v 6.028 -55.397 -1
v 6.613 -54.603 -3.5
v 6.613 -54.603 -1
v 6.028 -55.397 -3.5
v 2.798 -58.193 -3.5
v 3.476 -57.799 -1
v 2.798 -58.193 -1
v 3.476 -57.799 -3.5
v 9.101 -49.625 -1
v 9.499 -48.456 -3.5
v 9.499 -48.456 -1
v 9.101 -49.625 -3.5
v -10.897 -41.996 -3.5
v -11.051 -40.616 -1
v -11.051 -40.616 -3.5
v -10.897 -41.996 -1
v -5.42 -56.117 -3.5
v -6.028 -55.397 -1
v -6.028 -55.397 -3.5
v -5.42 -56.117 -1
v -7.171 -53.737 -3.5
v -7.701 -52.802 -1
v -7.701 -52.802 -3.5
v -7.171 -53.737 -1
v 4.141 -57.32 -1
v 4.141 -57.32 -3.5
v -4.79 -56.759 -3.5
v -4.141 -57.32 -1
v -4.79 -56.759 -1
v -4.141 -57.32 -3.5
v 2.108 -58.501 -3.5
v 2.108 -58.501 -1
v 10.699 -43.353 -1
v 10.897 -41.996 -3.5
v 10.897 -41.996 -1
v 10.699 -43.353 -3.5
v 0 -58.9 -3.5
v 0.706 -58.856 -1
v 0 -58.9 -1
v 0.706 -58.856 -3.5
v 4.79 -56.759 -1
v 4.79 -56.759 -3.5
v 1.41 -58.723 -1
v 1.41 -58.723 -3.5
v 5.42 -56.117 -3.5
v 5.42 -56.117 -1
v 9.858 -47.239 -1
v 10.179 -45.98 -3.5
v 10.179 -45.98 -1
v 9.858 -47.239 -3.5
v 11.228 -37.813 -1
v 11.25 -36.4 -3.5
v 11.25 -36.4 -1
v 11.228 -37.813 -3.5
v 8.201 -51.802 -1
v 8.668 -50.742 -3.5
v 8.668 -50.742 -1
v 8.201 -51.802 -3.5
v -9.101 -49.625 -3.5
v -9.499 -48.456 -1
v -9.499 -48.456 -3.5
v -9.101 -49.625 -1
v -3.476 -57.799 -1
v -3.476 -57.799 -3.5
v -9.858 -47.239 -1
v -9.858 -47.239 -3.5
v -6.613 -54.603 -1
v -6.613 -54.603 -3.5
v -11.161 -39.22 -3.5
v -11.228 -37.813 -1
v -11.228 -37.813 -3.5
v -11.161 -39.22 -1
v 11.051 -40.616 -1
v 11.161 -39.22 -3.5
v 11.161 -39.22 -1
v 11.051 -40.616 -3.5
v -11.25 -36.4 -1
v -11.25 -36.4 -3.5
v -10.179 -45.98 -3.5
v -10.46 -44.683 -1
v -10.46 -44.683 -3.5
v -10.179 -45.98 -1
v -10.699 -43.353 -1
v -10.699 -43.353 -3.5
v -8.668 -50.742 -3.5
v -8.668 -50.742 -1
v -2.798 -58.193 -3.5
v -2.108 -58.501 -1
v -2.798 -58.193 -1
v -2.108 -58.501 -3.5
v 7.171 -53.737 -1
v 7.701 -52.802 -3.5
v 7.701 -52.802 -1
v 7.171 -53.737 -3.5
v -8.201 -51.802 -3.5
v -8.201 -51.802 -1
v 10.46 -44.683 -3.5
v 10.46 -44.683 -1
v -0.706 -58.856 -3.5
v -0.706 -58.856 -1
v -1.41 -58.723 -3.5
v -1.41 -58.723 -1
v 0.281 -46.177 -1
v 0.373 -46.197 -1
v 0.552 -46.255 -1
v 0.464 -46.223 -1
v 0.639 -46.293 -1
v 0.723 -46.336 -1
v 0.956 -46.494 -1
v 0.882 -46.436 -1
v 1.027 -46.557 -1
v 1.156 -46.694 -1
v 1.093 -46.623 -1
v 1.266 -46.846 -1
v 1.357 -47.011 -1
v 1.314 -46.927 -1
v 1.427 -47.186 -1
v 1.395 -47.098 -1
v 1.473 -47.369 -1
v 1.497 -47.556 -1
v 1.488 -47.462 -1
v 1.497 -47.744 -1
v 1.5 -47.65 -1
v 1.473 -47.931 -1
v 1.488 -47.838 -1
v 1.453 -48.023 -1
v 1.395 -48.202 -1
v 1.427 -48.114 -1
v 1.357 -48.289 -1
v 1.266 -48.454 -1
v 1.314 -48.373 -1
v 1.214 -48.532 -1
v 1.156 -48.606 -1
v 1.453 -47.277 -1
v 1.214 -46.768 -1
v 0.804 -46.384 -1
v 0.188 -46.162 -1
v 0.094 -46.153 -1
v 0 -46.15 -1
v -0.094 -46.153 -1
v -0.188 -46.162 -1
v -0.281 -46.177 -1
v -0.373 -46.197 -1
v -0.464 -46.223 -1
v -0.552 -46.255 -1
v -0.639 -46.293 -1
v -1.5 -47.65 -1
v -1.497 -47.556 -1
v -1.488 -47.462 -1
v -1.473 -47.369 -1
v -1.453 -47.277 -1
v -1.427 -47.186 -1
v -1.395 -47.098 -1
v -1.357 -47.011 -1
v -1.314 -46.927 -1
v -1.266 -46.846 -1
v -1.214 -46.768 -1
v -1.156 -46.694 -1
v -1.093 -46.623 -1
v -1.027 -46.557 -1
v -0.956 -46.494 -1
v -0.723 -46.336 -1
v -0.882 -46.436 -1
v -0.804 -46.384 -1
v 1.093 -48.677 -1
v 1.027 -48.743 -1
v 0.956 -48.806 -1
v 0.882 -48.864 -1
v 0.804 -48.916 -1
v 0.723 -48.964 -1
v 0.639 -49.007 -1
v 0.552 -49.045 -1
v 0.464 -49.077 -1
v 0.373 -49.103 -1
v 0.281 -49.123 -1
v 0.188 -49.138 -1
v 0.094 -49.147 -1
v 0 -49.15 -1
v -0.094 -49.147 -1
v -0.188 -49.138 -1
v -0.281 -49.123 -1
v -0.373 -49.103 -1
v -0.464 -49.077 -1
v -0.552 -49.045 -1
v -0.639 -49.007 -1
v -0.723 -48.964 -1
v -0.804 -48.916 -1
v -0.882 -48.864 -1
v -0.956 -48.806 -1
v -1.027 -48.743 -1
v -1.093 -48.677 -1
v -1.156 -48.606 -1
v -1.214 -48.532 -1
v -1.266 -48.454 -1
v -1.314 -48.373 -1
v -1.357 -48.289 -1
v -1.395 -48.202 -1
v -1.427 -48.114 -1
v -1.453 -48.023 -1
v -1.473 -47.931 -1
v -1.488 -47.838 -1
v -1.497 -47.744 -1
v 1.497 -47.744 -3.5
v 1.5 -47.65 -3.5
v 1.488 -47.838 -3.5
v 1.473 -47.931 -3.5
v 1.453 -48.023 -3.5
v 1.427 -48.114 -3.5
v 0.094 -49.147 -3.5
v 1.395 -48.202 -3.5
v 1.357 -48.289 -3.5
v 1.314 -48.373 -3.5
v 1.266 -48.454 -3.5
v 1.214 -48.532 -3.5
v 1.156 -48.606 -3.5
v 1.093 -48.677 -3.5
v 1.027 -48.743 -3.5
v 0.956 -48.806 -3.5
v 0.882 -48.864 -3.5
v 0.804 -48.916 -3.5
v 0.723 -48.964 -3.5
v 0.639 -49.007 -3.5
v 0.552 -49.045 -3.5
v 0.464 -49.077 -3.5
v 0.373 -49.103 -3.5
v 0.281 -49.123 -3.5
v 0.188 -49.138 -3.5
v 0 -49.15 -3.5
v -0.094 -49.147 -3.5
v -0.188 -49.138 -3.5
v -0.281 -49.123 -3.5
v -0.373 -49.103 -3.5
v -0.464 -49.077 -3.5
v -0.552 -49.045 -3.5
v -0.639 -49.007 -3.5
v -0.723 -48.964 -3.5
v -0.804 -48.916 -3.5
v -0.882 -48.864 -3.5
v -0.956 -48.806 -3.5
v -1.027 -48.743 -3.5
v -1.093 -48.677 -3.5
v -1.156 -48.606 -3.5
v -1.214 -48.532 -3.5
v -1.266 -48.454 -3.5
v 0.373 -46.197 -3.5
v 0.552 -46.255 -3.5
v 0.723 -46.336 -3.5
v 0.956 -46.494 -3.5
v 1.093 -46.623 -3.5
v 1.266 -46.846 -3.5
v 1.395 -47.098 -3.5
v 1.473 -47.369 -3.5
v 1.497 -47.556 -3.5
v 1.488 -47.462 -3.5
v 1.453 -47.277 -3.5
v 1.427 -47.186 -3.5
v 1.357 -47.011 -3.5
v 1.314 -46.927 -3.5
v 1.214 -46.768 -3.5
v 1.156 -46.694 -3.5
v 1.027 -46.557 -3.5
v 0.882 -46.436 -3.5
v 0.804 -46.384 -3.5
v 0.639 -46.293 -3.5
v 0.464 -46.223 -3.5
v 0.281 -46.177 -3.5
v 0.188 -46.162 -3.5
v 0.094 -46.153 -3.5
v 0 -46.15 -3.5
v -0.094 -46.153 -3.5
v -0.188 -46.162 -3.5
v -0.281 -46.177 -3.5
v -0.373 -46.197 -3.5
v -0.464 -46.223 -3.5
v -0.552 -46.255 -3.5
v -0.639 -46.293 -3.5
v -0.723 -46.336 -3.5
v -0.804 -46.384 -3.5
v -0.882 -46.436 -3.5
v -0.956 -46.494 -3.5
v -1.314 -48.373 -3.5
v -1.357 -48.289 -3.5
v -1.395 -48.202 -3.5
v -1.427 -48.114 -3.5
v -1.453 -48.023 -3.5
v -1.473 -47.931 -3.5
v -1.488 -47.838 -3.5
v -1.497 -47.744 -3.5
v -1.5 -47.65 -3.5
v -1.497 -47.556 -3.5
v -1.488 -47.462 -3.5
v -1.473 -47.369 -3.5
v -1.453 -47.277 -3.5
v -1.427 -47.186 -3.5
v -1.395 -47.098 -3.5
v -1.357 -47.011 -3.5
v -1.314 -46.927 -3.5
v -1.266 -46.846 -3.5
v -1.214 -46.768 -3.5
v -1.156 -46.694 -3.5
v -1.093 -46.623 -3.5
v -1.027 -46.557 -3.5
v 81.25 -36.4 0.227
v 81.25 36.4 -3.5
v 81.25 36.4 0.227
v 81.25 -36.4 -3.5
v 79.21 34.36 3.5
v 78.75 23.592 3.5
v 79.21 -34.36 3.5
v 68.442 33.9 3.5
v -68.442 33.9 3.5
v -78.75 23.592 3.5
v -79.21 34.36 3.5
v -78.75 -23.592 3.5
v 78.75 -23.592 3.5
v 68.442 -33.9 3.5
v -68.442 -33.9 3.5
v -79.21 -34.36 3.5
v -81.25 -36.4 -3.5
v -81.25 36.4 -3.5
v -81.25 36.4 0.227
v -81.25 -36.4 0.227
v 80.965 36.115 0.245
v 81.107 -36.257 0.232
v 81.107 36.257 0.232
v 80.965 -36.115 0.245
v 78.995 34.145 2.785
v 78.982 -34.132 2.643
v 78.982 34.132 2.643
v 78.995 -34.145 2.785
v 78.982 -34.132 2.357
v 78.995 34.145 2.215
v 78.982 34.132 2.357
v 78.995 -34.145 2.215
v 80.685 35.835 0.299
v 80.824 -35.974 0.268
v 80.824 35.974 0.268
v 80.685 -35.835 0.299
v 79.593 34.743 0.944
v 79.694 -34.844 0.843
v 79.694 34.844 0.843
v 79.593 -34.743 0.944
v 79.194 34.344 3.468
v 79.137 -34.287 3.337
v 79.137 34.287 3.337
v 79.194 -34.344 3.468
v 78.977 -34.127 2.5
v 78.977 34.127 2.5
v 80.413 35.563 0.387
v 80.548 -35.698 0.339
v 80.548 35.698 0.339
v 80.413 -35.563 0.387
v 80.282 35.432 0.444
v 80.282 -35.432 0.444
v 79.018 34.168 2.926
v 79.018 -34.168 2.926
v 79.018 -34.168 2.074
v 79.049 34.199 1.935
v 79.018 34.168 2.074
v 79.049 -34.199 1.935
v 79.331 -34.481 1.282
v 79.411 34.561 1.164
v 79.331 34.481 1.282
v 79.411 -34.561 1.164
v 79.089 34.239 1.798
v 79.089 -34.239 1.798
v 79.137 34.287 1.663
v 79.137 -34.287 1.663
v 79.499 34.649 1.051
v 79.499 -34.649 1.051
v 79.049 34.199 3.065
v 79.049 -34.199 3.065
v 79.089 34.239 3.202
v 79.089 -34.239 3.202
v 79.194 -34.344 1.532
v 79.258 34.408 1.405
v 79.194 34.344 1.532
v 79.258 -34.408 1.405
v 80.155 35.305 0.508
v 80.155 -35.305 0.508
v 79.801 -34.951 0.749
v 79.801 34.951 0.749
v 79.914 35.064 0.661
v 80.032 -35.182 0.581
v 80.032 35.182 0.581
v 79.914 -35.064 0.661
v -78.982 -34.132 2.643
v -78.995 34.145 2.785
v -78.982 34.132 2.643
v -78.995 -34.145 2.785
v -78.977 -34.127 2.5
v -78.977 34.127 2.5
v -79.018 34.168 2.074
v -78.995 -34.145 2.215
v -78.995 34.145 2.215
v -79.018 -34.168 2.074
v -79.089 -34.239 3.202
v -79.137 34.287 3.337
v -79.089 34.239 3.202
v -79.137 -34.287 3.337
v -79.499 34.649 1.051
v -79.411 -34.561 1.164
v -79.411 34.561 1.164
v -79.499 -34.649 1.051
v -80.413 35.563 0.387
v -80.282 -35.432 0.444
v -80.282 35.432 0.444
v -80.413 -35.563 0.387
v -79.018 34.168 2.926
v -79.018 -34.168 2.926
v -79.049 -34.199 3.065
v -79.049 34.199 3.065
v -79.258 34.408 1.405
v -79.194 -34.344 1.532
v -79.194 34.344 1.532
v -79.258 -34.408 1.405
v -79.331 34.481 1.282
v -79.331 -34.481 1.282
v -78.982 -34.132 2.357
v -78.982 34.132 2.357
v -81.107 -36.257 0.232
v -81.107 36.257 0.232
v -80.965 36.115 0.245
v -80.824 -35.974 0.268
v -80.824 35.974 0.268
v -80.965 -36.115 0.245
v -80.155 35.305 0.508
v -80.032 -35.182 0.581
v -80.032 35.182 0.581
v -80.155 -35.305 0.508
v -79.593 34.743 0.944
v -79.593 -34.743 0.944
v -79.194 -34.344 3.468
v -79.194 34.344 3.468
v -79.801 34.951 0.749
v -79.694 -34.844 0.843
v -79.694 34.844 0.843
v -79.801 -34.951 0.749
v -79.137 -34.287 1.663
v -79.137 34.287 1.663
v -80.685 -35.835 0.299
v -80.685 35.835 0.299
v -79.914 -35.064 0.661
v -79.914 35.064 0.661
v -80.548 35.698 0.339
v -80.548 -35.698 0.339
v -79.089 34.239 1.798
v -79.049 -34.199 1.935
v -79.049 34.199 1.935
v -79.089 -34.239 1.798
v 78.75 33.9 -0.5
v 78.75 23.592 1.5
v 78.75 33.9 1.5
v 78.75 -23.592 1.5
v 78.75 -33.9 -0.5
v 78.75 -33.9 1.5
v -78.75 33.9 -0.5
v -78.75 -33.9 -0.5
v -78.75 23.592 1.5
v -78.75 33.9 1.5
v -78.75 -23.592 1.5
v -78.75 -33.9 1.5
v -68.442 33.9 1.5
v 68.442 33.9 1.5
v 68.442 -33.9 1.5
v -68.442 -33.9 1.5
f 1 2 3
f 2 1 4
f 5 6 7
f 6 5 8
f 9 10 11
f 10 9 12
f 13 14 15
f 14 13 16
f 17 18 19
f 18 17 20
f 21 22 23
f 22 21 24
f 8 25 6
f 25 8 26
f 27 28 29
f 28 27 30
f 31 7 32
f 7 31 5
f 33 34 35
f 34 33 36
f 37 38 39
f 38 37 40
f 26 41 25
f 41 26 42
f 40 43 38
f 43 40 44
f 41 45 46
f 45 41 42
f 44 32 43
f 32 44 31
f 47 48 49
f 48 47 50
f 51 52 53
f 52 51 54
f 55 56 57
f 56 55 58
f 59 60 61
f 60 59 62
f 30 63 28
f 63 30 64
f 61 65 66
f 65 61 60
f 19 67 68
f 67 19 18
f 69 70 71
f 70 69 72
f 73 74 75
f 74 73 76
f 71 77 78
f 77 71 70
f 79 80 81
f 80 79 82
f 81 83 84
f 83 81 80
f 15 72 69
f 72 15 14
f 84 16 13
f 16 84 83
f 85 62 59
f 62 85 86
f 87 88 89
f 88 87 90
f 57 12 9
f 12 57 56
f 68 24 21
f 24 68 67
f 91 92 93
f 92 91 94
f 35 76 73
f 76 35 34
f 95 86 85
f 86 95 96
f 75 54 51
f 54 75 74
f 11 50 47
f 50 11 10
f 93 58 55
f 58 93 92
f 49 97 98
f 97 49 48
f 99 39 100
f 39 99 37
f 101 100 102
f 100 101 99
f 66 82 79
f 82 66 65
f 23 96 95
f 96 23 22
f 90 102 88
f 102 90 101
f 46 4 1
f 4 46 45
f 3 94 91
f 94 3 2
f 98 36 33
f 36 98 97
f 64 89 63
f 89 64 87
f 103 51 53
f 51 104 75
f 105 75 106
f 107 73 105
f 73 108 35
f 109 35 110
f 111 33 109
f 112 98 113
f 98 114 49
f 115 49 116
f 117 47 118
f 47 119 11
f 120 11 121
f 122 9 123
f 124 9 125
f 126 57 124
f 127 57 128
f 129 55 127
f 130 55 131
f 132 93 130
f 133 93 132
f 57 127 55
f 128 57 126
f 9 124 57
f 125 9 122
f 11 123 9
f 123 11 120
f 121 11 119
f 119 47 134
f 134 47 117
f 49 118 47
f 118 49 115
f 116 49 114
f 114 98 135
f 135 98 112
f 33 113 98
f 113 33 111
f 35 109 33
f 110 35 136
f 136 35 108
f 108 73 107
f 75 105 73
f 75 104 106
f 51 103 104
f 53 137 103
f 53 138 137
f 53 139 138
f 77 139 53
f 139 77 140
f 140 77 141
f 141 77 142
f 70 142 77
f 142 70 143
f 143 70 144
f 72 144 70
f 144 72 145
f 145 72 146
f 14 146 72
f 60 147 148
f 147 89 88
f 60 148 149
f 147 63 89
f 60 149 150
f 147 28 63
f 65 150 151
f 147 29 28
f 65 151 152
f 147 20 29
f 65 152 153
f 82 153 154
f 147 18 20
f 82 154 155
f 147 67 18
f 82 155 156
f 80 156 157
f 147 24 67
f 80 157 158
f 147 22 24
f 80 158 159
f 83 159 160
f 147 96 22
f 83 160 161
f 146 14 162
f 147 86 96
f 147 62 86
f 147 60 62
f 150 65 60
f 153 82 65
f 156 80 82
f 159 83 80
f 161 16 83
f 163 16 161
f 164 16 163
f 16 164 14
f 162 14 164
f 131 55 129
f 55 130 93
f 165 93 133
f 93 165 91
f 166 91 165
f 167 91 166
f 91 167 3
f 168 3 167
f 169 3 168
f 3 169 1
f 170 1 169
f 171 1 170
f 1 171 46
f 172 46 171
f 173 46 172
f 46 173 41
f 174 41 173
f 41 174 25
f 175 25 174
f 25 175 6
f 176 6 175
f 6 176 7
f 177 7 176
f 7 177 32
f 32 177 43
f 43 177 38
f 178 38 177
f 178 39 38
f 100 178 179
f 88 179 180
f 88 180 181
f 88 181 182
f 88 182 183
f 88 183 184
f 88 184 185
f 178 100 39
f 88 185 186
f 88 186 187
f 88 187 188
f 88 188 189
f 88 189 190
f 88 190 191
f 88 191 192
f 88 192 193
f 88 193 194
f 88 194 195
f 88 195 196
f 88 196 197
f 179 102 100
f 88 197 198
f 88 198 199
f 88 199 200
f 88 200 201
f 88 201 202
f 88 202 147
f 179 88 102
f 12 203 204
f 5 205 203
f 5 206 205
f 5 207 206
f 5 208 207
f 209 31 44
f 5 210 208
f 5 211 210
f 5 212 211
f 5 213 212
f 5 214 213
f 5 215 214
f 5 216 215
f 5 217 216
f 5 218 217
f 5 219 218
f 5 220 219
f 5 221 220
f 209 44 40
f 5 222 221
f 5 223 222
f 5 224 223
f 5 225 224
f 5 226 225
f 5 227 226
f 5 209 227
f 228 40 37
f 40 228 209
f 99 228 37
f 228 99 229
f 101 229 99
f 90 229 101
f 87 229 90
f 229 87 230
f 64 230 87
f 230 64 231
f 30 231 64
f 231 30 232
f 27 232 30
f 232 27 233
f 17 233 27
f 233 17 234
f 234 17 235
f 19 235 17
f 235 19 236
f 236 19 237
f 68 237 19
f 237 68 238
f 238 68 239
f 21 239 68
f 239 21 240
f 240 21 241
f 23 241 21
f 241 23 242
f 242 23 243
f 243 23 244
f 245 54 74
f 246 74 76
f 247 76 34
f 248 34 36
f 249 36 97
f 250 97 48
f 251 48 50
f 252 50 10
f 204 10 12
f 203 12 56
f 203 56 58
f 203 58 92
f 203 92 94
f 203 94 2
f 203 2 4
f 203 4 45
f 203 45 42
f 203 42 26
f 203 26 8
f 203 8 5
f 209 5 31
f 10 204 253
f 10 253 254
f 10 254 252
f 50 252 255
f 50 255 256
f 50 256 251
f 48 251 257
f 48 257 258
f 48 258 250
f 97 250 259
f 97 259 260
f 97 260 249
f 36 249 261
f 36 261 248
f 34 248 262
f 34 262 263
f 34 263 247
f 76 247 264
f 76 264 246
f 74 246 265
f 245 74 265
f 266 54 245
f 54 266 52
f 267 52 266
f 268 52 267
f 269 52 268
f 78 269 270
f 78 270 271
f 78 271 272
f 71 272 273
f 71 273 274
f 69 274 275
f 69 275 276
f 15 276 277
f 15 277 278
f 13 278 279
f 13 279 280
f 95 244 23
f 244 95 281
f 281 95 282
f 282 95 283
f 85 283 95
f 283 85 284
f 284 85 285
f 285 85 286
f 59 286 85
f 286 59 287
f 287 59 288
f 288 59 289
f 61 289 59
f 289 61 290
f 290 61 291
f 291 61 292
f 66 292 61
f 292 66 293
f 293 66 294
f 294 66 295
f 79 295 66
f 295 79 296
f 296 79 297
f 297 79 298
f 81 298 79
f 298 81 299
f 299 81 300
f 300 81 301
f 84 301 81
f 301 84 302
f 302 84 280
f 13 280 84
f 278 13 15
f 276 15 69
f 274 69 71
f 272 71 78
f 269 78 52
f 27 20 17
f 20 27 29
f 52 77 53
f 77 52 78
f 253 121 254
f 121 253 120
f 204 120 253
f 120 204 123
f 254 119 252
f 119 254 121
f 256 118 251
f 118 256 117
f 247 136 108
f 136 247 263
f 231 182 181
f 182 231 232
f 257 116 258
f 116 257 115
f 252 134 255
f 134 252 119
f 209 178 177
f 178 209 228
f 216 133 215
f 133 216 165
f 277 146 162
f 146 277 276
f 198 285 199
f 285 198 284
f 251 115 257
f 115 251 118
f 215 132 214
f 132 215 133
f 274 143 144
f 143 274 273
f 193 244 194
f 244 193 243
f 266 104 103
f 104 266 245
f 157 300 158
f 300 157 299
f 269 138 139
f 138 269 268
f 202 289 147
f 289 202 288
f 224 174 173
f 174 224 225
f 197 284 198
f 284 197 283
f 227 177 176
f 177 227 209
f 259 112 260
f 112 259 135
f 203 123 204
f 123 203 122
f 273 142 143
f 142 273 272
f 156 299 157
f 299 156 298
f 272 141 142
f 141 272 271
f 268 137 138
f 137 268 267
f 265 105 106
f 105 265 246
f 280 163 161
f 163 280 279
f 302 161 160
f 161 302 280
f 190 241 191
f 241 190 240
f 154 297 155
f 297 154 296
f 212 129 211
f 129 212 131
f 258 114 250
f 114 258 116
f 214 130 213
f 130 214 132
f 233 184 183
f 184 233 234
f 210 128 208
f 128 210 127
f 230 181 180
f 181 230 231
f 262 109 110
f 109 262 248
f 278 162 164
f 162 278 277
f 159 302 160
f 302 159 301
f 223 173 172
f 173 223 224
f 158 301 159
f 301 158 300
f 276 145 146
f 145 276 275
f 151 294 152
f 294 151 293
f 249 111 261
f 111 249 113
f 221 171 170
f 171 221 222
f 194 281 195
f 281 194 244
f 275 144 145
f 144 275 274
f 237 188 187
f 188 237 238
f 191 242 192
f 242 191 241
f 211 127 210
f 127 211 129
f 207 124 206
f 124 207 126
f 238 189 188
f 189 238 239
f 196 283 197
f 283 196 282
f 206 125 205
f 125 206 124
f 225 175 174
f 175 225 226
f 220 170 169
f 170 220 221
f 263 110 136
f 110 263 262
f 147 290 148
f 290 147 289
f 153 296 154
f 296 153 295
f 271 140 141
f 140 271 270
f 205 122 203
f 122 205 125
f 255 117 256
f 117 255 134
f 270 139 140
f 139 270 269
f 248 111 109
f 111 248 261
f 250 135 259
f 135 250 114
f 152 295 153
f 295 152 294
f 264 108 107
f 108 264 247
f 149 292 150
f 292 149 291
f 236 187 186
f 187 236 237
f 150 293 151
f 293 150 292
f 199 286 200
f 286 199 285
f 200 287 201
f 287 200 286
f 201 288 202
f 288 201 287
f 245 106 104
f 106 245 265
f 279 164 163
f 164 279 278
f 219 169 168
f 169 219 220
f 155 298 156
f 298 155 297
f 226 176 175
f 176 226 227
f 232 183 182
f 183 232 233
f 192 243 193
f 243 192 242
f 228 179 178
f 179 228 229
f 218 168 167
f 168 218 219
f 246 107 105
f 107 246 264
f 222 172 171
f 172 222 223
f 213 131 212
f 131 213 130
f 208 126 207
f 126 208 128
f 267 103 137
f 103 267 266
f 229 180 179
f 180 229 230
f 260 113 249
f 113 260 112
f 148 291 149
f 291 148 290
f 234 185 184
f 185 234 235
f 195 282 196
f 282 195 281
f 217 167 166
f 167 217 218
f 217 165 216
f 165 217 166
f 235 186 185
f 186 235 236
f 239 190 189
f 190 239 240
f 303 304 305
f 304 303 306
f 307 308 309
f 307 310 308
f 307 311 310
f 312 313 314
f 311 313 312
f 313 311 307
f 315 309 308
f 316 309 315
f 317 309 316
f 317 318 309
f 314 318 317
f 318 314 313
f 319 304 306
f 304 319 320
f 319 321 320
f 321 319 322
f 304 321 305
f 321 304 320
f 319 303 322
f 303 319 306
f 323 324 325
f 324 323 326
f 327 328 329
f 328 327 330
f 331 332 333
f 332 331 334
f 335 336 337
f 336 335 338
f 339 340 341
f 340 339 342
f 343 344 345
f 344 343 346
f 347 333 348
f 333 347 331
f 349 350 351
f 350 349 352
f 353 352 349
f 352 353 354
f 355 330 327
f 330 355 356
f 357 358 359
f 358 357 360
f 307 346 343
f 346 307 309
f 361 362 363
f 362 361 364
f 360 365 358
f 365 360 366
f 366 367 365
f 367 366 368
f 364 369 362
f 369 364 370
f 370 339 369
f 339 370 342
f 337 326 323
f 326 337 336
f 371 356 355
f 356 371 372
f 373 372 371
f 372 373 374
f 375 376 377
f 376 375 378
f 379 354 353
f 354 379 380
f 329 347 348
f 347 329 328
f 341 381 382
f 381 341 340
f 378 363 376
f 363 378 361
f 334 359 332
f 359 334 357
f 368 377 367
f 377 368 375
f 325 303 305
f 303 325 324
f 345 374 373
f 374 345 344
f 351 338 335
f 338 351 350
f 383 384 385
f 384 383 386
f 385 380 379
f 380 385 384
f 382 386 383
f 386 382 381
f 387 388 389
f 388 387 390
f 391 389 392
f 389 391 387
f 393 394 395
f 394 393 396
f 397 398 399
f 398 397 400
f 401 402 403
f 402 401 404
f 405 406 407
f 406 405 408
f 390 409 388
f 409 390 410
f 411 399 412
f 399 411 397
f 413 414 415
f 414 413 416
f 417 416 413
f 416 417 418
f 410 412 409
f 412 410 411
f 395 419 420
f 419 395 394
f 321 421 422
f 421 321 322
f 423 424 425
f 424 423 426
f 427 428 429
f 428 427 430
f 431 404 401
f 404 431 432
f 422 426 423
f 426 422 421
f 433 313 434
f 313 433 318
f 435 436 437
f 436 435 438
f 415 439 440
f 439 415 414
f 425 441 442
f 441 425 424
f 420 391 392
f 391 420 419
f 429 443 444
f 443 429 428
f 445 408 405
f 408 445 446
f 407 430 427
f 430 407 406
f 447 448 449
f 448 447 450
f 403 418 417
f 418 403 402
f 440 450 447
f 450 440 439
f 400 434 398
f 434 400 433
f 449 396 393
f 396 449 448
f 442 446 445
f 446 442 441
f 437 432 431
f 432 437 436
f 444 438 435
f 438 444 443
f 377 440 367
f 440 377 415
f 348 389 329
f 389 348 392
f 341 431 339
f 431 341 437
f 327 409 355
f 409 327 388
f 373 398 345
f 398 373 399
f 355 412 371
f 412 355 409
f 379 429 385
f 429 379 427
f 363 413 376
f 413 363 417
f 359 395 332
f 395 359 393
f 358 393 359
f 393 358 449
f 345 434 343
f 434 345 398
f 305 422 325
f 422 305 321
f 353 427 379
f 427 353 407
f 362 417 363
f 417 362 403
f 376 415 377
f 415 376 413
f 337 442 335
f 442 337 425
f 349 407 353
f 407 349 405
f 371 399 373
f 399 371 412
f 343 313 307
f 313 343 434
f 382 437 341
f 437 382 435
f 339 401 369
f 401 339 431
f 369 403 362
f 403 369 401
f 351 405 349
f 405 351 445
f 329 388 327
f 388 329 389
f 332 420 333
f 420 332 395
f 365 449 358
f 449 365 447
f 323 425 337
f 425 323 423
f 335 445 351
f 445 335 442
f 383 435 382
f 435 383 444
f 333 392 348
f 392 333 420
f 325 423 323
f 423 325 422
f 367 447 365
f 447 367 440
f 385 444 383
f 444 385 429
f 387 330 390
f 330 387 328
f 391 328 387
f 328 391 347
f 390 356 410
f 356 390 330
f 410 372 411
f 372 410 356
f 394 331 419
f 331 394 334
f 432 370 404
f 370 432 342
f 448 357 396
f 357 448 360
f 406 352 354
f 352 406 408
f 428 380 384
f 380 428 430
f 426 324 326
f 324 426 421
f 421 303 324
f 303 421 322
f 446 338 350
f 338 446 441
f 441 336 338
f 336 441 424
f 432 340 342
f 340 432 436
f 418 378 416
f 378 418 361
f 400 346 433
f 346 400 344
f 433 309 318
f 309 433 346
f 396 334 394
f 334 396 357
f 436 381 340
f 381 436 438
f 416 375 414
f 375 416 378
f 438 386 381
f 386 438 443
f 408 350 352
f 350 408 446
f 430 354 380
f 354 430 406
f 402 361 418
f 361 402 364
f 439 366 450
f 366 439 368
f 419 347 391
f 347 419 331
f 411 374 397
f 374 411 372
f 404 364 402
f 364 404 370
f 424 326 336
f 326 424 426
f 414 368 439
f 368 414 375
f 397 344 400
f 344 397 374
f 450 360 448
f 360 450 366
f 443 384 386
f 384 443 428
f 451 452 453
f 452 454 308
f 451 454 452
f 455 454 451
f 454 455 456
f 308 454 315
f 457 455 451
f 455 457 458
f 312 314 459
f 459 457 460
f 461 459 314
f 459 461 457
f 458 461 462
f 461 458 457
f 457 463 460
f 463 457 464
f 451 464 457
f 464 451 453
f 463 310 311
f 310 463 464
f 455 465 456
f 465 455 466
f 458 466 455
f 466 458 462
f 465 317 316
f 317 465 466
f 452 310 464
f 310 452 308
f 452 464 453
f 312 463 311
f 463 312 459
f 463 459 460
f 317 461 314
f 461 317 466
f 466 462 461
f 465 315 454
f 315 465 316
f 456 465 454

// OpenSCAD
//------------------Variables------------------\\ 

		//----Global Values----\\
			//The default unit in OpenSCAD is mm and this unit variable allows one to change the variables in the code with units other than mm. Default is 1, for mm, but cm is 10 and inches is 25.4. Note that this entails that you change EVERY variable (except maybe sfn)  so that one piece of the model is not ridiculously bigger/smaller than the other parts. 
				unit=1;

			//The detail in the cylinders/spheres of the shape.
				sfn=100;

		//----Bill Specifics----\\

			//The length of the bill.
				billength= 157.5;

			//The width of the bill. 
				billwidth = 67.8;

			//The thickness of the frame. 
				framethick = 5;
			
			//Bottom Thickness
				botthick = 2 ;

		//----Frame Specifics----\\

			//The border of the frame length-wise. This is the measurement from the inside of the frame to the outisde on the length (x) axis. The cylinders that shape the frame use this measurement.
				xframe = 5;

			//The border of the frame width-wise. This is the measurement from the inside of the frame to the outisde on the width (y) axis.
				yframe = 5;
		
			//How prominent the frame shaping is. Play with this value. Default is 1.1.
				frameshapethick = 1.1;

			//How raised the frame shaping is. Play with this value as well. 
				frameshaperaise = 0;


	//----Bill holder----\\
	billholdx=5*unit;
	billholdz=2*unit;
	billholdlift=2.5*unit;
	
	//----Hook sizing----\\
		//Hook size
		hooksize=22.5;

		//Hook hole size
		hookhole=3;

		//Hook thickness
		hookthick=2.5;

//-------------------Modules-------------------\\ 

	//----Basic Frame Shapes----\\
		module bill() {
			cube([billength*unit, billwidth*unit,framethick*unit], center=true);
		}

		module outsideframe() { 
			cube([(billength+xframe)*unit, (billwidth+yframe)*unit, (framethick+botthick)*unit], center=true);
		}

	//----Frame shaping.----\\
		//Frame shaping cylinder on the X Axis.
			module xfsc() {
				cylinder(r=(framethick*unit)/(frameshapethick*2), h=(billwidth+yframe)*unit+xframe, center=true, $fn=sfn);
			}

		//Frame shaping cylinder on the Y Axis.
			module yfsc() {
				cylinder(r=(framethick*unit)/(frameshapethick*2), h=(billength+xframe)*unit+yframe, center=true, $fn=sfn);
			}

		//Frameshaping general module
			module frameshaping() {
				translate([(billength/2)*unit+xframe/2, 0, (framethick/2)*unit]) {
					rotate([90,0,0]) {
						xfsc();
					}
				}
				translate([(-billength/2)*unit-xframe/2, 0, (framethick/2)*unit]) {
					rotate([90,0,0]) {
						xfsc();
					}
				}

				translate([0, (billwidth/2)*unit+yframe/2, (framethick/2)*unit]) {
					rotate([90,0,90]) {
						yfsc();
					}
				}
				translate([0, (-billwidth/2)*unit-yframe/2, (framethick/2)*unit]) {
					rotate([90,0,90]) {
						yfsc();
					}
				}
			}

	






module billhold(){
	translate([billength/2-billholdx/1.375+0.25, billwidth/2-billholdx/1.375+0.25, billholdlift]) {
		rotate([0,0,45]) {
			scale([1,1.75,1]){
				cylinder($fn=3, r=billholdx, h=billholdz, center=true);
			}
		}
	}

	translate([-billength/2+billholdx/1.375-0.25, billwidth/2-billholdx/1.375+0.25, billholdlift]) {
		rotate([0,0,135]) {
			scale([1,1.75,1]){
				cylinder($fn=3, r=billholdx, h=billholdz, center=true);
			}
		}
	}
	translate([-billength/2+billholdx/1.375-0.25, -billwidth/2+billholdx/1.375-0.25, billholdlift]) {
		rotate([0,0,225]) {
			scale([1,1.75,1]){
				cylinder($fn=3, r=billholdx, h=billholdz, center=true);
			}
		}
	}

	translate([billength/2-billholdx/1.375+0.25, -billwidth/2+billholdx/1.375-0.25, billholdlift]) {
		rotate([0,0,315]) {
			scale([1,1.75,1]){
				cylinder($fn=3, r=billholdx, h=billholdz, center=true);
			}
		}
	}





}
		
	module hook() {
		translate([0,-((billwidth+xframe)/2)*unit, (-(framethick+botthick)/2)*unit ]) {
			difference() {
				scale([1,2,1]) {
					cylinder(r=(hooksize/2)*unit, h=hookthick*unit, $fn=sfn);
				}
				translate([(-hooksize/2)*unit, 0]) {
					cube([hooksize*unit, hooksize*unit, hookthick*unit]);
				}
				translate([0, (-hooksize/2)*unit, 0]) {
					cylinder(r=(hookhole/2)*unit, h=hookthick*unit, $fn=sfn);
				}
			}
		}
	}


	//Plating module
	module frame1() {
		difference() {
			union(){
				outsideframe();
				hook();
			}
			translate([0,0, botthick]) {
				bill();
			}
			translate([0,0, frameshaperaise]) {
				frameshaping();
			}
			
		}
	}

	module frame(){
	frame1();
	billhold();
}

frame();
